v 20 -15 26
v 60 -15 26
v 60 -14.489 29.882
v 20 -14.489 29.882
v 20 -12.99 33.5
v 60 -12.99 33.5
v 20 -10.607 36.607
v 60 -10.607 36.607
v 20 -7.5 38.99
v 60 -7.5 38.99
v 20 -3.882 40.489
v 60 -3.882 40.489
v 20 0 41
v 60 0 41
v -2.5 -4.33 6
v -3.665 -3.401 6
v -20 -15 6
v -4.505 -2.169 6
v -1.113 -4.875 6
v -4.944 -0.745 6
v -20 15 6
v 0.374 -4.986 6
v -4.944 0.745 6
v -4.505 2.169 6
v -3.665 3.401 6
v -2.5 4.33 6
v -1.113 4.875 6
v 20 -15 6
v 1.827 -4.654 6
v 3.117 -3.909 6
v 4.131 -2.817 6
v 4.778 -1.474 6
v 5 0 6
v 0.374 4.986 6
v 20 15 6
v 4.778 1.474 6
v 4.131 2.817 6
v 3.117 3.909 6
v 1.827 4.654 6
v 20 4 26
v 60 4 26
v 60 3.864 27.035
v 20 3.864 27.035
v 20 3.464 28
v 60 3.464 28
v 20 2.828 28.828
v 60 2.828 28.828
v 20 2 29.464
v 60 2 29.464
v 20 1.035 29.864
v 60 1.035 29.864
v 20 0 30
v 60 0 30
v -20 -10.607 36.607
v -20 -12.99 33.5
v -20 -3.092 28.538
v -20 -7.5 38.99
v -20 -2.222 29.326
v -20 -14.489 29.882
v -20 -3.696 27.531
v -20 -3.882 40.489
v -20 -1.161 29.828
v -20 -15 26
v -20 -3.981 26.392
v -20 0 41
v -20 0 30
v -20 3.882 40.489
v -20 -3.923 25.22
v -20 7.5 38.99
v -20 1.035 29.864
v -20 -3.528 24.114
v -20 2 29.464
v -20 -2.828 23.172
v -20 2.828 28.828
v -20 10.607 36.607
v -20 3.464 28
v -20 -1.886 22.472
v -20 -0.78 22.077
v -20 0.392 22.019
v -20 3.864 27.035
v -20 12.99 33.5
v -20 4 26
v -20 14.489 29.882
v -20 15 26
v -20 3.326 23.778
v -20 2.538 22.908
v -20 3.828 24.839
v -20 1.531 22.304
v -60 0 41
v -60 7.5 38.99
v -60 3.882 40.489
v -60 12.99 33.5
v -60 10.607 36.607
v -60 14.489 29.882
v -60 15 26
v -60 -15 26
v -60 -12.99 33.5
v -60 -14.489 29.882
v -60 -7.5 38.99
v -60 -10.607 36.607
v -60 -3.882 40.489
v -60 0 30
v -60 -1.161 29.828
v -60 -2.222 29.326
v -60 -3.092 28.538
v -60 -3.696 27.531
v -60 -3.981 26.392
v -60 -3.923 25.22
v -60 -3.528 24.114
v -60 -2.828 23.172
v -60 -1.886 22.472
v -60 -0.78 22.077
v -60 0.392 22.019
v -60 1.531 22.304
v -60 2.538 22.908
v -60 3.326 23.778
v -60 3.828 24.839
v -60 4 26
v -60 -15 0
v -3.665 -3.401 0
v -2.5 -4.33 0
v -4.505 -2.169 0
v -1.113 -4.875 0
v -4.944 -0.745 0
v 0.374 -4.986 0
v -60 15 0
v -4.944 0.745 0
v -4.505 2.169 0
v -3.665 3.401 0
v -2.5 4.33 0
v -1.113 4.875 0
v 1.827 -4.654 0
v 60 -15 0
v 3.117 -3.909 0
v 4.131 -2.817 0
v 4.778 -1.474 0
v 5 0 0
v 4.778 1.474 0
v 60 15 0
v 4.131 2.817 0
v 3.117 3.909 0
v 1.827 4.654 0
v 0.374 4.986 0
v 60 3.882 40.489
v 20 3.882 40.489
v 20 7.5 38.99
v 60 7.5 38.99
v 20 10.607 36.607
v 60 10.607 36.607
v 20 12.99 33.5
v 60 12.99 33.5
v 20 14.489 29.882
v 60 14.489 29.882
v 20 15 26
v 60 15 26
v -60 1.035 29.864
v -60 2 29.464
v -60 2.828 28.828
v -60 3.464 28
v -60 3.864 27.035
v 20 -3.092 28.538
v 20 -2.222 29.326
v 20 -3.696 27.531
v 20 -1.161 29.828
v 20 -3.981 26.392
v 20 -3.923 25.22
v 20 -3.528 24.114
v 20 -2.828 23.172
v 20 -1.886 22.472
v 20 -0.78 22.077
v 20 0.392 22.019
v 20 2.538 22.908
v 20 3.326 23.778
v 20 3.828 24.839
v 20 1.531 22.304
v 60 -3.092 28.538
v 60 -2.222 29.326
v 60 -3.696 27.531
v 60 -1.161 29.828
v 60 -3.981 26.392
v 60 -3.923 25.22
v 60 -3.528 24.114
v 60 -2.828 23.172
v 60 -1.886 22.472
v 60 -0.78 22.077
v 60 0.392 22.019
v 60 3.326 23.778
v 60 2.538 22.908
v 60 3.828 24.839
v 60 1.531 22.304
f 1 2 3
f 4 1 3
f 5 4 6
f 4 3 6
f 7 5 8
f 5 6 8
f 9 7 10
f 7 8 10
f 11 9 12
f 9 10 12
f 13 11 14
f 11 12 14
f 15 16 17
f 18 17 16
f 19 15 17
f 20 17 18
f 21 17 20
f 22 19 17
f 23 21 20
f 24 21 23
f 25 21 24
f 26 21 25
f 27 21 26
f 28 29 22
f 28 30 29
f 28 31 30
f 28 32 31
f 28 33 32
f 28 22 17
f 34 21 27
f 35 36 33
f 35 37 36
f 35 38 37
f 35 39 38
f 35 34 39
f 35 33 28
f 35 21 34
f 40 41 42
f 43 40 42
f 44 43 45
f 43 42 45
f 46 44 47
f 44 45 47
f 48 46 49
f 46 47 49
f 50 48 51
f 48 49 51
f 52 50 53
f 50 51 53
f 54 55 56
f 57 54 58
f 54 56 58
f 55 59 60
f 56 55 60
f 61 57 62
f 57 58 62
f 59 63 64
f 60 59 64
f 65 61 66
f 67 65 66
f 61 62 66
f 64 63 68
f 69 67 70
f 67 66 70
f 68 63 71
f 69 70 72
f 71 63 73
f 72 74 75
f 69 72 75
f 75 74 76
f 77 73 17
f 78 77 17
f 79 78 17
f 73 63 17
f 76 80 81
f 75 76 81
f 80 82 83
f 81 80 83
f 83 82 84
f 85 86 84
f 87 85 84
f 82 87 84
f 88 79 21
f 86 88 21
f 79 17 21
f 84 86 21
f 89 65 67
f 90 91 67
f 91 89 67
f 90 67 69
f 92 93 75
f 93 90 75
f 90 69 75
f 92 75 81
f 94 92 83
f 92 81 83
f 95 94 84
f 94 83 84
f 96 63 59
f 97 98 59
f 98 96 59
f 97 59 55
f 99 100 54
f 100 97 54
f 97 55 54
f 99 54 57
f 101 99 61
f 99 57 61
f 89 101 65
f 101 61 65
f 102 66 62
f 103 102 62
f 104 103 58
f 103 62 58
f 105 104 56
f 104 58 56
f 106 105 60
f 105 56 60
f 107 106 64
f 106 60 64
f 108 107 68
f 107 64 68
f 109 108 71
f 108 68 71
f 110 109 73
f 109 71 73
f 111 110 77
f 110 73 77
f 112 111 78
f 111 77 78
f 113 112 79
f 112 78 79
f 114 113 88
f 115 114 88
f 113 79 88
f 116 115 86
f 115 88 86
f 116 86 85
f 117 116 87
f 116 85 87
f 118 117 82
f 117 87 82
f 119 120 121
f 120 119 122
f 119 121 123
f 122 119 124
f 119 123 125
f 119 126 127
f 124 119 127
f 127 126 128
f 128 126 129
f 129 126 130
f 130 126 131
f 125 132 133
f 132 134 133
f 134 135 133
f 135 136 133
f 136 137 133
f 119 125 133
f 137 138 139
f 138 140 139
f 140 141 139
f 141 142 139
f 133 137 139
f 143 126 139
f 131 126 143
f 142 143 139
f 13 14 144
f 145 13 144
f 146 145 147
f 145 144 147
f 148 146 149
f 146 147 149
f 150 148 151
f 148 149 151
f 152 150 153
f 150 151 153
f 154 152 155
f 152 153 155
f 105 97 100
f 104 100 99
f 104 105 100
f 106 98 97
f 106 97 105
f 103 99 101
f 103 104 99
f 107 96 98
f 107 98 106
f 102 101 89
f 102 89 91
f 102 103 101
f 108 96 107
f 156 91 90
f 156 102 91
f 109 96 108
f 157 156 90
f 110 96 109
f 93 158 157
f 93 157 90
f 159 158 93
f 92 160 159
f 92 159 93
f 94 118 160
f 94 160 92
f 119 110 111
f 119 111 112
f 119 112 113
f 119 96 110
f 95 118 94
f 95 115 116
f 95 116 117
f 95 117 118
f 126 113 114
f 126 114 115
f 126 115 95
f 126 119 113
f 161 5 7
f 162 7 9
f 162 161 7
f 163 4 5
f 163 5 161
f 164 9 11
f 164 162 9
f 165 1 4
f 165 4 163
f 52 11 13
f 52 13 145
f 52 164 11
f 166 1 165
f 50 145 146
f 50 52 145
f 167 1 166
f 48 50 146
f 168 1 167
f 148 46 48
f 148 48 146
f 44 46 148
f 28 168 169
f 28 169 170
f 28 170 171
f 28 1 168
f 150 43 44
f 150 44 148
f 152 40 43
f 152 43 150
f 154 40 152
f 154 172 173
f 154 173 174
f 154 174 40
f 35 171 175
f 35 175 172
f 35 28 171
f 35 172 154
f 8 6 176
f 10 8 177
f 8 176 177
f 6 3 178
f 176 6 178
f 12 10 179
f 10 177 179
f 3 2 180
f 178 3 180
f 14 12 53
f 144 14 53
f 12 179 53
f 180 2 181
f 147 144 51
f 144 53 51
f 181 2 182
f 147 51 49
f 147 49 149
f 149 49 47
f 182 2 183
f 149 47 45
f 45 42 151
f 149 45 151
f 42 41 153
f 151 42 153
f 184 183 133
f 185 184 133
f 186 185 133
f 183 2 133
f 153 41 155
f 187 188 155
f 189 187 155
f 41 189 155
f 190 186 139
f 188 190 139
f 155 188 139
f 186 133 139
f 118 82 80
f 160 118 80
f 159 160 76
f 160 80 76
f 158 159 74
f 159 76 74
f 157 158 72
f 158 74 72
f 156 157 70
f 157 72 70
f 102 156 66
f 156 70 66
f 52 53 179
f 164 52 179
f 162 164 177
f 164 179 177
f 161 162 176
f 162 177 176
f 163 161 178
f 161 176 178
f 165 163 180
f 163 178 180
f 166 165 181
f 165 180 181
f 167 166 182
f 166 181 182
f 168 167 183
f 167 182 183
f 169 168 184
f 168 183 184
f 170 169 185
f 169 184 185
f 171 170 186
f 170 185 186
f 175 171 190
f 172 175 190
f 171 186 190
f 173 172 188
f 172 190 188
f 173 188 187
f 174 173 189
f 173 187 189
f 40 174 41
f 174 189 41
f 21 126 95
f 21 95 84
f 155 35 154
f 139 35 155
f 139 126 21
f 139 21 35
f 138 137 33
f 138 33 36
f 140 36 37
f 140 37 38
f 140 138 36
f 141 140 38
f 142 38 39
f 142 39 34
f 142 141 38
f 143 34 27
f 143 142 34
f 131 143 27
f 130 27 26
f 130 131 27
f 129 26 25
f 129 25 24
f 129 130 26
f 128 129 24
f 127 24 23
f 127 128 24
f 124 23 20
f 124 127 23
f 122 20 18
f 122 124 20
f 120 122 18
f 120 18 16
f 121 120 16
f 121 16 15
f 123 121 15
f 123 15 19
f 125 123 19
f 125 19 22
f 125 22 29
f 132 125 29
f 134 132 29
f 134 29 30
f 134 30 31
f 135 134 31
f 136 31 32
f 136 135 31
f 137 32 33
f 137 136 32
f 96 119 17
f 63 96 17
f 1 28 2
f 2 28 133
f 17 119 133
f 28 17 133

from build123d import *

# Parameters (mm, degrees)
F0_W     = 120
F0_H     = 30
F0_R     = 5
F1_DEPTH = 6
F2_W     = 40
F2_H     = 30
F3_DEPTH = 35
F5_DEPTH = 122


with BuildPart() as f1:
    # F0 (on Top) → F1 (new body)
    with BuildSketch(Plane.XY):
        Rectangle(F0_W, F0_H)
        Circle(F0_R, mode=Mode.SUBTRACT)
    extrude(amount=F1_DEPTH)

    # F2 (on face) → F3 (join)
    with BuildSketch(Plane.XY.offset(6)):
        with Locations((-40, 0)):
            Rectangle(F2_W, F2_H)
        with Locations((40, 0)):
            Rectangle(F2_W, F2_H)
    extrude(amount=F3_DEPTH)

    # F4 (on face) → F5 (cut)
    with BuildSketch(Plane.YZ.offset(60)):
        with BuildLine():
            Line((0, 41), (-15, 41))
            Line((-15, 41), (-15, 26))
            ThreePointArc((-15, 26), (-10.606602, 36.606602), (0, 41))
        make_face()
        with BuildLine():
            Line((15, 41), (0, 41))
            ThreePointArc((0, 41), (10.606602, 36.606602), (15, 26))
            Line((15, 26), (15, 41))
        make_face()
        with BuildLine():
            ThreePointArc((4, 26), (2.828427, 28.828427), (0, 30))
            ThreePointArc((0, 30), (-2.828427, 23.171573), (4, 26))
        make_face()
    extrude(amount=-F5_DEPTH, mode=Mode.SUBTRACT)


solid = f1.part
